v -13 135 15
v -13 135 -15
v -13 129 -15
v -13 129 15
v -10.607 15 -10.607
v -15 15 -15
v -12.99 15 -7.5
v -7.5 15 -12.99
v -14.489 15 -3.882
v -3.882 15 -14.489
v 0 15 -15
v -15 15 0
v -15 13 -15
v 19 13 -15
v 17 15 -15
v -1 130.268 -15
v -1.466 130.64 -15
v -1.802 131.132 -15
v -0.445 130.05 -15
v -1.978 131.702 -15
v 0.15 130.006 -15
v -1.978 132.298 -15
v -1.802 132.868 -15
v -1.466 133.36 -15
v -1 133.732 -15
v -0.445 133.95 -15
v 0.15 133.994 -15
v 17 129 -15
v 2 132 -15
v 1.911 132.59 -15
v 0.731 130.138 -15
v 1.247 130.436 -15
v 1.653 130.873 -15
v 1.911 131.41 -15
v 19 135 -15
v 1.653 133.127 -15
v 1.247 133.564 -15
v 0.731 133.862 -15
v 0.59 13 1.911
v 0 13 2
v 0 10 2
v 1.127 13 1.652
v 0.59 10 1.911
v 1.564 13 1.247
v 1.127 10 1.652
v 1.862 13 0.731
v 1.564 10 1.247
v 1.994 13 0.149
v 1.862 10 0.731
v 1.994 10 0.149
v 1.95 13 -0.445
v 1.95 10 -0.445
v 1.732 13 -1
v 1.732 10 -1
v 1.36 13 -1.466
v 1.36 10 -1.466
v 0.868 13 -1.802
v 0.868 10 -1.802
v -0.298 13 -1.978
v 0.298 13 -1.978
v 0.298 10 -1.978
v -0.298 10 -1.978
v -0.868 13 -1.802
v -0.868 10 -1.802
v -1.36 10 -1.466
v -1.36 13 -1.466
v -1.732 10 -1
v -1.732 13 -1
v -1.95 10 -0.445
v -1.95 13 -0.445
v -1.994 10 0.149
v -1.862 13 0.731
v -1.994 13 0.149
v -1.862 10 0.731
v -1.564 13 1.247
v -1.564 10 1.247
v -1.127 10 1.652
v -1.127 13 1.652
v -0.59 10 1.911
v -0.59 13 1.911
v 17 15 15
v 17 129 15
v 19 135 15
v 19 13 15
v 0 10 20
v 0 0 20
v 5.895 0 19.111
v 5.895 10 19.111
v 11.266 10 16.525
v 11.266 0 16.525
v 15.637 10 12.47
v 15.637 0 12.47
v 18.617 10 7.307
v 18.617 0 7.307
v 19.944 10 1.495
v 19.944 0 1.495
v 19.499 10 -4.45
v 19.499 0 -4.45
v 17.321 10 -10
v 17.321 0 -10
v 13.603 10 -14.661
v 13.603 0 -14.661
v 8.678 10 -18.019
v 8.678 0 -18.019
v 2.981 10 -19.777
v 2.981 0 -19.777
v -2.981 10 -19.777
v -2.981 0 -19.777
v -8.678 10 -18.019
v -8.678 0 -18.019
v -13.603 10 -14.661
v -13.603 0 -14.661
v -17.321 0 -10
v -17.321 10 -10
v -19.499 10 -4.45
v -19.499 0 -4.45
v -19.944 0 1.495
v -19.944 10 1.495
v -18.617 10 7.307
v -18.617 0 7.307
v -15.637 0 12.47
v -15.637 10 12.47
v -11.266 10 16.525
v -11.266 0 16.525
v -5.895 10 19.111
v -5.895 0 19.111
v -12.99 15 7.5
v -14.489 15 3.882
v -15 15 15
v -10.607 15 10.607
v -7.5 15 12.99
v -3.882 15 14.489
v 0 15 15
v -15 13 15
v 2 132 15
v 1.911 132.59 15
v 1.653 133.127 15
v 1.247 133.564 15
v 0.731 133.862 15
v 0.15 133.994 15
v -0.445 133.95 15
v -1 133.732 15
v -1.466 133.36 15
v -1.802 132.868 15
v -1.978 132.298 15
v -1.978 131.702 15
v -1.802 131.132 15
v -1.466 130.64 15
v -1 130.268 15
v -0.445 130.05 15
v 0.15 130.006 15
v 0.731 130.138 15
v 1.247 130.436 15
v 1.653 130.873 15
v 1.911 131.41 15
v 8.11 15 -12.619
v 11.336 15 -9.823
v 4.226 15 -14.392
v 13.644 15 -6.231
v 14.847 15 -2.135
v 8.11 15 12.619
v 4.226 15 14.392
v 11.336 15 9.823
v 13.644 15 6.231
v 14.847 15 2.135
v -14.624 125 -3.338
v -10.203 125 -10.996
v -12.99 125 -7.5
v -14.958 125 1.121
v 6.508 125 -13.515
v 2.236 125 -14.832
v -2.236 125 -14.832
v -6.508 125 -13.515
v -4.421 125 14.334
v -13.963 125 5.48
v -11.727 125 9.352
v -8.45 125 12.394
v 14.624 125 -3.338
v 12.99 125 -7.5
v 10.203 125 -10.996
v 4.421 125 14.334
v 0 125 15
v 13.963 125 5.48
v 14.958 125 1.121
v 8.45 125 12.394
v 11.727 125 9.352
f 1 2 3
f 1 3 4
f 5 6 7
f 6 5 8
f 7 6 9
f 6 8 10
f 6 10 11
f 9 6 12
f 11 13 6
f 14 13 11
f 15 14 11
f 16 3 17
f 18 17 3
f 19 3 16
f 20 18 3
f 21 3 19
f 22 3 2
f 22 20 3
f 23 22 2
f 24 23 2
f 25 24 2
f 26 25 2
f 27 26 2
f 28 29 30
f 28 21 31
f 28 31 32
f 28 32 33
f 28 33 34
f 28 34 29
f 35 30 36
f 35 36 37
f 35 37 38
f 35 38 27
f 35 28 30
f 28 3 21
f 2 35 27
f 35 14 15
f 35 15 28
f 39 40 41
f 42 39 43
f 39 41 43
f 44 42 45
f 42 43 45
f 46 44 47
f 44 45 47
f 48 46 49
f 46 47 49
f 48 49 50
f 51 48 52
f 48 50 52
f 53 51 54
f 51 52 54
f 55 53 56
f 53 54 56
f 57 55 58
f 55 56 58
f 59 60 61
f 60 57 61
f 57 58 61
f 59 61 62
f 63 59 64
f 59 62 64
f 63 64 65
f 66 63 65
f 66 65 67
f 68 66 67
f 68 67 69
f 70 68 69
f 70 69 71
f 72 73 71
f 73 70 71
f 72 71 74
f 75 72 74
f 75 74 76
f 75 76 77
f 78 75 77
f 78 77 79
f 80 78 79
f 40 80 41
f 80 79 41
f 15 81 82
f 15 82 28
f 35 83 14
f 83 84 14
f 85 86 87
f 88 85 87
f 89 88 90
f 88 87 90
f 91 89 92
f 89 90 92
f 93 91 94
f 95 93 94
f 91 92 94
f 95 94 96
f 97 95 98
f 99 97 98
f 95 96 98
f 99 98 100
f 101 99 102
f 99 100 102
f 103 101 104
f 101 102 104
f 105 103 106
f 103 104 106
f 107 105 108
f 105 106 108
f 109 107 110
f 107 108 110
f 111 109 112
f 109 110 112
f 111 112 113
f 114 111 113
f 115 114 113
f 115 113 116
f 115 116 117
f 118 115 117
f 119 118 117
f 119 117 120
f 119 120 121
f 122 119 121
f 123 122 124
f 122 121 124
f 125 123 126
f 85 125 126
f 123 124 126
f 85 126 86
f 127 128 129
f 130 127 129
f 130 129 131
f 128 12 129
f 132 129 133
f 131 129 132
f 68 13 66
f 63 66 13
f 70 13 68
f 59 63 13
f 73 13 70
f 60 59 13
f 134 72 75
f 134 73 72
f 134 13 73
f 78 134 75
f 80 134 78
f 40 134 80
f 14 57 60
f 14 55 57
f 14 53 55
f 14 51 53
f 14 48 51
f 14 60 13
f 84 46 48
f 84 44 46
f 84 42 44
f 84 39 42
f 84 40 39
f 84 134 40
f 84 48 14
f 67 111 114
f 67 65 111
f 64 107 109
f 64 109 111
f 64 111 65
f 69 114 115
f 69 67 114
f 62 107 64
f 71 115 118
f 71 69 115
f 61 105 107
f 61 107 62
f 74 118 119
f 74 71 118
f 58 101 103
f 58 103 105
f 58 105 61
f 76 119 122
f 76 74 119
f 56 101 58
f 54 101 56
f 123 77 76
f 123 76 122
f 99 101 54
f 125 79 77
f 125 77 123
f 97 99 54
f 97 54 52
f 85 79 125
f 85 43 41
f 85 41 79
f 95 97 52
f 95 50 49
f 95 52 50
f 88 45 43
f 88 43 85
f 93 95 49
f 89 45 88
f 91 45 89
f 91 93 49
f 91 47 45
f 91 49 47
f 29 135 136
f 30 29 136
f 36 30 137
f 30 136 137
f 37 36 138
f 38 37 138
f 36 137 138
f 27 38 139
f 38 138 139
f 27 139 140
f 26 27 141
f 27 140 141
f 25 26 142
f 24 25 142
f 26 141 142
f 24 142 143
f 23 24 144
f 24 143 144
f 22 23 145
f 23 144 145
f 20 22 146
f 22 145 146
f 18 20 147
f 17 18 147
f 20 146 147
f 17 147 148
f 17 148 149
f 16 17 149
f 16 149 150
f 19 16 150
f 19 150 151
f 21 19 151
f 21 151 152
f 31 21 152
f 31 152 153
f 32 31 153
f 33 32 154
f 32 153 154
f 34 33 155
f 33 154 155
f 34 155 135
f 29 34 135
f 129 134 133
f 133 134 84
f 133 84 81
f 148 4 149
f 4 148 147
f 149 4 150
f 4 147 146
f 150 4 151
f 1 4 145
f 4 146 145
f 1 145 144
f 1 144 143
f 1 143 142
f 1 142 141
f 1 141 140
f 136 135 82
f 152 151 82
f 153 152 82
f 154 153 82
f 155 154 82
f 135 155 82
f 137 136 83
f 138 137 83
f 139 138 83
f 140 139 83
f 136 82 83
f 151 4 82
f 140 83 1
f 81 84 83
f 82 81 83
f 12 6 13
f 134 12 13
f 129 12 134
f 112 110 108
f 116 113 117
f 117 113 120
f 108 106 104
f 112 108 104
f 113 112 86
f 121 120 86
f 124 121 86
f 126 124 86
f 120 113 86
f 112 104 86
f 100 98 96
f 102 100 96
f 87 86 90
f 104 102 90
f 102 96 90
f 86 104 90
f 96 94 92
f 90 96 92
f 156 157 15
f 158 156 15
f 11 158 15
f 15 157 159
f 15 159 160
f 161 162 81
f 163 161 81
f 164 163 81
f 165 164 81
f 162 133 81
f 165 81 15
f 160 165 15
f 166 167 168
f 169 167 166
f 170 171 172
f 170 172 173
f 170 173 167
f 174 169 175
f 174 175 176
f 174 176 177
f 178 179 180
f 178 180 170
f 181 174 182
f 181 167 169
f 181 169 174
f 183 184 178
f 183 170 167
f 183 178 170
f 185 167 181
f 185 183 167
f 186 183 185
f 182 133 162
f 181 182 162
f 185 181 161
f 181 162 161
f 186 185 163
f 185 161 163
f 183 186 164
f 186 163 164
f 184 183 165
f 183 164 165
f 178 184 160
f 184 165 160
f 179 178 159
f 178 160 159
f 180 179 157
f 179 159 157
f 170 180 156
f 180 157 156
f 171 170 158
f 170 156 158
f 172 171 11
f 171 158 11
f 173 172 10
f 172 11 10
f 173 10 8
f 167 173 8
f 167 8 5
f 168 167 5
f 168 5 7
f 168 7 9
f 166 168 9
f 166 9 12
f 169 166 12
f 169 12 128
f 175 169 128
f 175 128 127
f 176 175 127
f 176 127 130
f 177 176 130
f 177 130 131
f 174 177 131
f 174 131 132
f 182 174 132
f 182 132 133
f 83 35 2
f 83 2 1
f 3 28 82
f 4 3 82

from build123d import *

# Parameters (mm, degrees)
SKETCH1_R          = 20
EXTRUDE1_DEPTH     = 10
SKETCH2_R          = 2
EXTRUDE2_DEPTH     = 5
SKETCH3_R          = 15
EXTRUDE3_DEPTH     = 110
SKETCH4_W          = 34
SKETCH4_H          = 30
EXTRUDE4_DEPTH     = 2
SKETCH5_W          = 2
SKETCH5_H          = 30
EXTRUDE5_DEPTH     = 120
SKETCH6_W          = 30
SKETCH6_H          = 6
EXTRUDE6_DEPTH     = 30
SKETCH7_R          = 2
CUT_EXTRUDE1_DEPTH = 30


with BuildPart() as part:
    # Sketch1 → Extrude1 (new body)
    with BuildSketch(Plane(origin=(0, 0, 0), x_dir=(1, 0, 0), z_dir=(0, 1, 0))):
        with Locations(Location((0, 0, 0), (0, 0, 270))):
            Circle(SKETCH1_R)
    extrude(amount=EXTRUDE1_DEPTH)

    # Sketch2 → Extrude2 (add)
    with BuildSketch(Plane(origin=(0, 10, 0), x_dir=(1, 0, 0), z_dir=(0, 1, 0))):
        with Locations(Location((0, 0, 0), (0, 0, 270))):
            Circle(SKETCH2_R)
    extrude(amount=EXTRUDE2_DEPTH)

    # Sketch3 → Extrude3 (add)
    with BuildSketch(Plane(origin=(0, 15, 0), x_dir=(1, 0, 0), z_dir=(0, 1, 0))):
        with Locations(Location((0, 0, 0), (0, 0, 270))):
            Circle(SKETCH3_R)
    extrude(amount=EXTRUDE3_DEPTH)

    # Sketch4 → Extrude4 (add)
    with BuildSketch(Plane.XZ.offset(-15)):
        with Locations((2, 0)):
            Rectangle(SKETCH4_W, SKETCH4_H)
    extrude(amount=EXTRUDE4_DEPTH)

    # Sketch5 → Extrude5 (add)
    with BuildSketch(Plane(origin=(0, 15, 0), x_dir=(1, 0, 0), z_dir=(0, 1, 0))):
        with Locations((18, 0)):
            Rectangle(SKETCH5_W, SKETCH5_H)
    extrude(amount=EXTRUDE5_DEPTH)

    # Sketch6 → Extrude6 (add)
    with BuildSketch(Plane.ZY.offset(-17)):
        with Locations((0, 132)):
            Rectangle(SKETCH6_W, SKETCH6_H)
    extrude(amount=EXTRUDE6_DEPTH)

    # Sketch7 → Cut-Extrude1 (cut)
    with BuildSketch(Plane.XY.offset(15)):
        with Locations((0.0001, 132)):
            Circle(SKETCH7_R)
    extrude(amount=-CUT_EXTRUDE1_DEPTH, mode=Mode.SUBTRACT)


solid = part.part
